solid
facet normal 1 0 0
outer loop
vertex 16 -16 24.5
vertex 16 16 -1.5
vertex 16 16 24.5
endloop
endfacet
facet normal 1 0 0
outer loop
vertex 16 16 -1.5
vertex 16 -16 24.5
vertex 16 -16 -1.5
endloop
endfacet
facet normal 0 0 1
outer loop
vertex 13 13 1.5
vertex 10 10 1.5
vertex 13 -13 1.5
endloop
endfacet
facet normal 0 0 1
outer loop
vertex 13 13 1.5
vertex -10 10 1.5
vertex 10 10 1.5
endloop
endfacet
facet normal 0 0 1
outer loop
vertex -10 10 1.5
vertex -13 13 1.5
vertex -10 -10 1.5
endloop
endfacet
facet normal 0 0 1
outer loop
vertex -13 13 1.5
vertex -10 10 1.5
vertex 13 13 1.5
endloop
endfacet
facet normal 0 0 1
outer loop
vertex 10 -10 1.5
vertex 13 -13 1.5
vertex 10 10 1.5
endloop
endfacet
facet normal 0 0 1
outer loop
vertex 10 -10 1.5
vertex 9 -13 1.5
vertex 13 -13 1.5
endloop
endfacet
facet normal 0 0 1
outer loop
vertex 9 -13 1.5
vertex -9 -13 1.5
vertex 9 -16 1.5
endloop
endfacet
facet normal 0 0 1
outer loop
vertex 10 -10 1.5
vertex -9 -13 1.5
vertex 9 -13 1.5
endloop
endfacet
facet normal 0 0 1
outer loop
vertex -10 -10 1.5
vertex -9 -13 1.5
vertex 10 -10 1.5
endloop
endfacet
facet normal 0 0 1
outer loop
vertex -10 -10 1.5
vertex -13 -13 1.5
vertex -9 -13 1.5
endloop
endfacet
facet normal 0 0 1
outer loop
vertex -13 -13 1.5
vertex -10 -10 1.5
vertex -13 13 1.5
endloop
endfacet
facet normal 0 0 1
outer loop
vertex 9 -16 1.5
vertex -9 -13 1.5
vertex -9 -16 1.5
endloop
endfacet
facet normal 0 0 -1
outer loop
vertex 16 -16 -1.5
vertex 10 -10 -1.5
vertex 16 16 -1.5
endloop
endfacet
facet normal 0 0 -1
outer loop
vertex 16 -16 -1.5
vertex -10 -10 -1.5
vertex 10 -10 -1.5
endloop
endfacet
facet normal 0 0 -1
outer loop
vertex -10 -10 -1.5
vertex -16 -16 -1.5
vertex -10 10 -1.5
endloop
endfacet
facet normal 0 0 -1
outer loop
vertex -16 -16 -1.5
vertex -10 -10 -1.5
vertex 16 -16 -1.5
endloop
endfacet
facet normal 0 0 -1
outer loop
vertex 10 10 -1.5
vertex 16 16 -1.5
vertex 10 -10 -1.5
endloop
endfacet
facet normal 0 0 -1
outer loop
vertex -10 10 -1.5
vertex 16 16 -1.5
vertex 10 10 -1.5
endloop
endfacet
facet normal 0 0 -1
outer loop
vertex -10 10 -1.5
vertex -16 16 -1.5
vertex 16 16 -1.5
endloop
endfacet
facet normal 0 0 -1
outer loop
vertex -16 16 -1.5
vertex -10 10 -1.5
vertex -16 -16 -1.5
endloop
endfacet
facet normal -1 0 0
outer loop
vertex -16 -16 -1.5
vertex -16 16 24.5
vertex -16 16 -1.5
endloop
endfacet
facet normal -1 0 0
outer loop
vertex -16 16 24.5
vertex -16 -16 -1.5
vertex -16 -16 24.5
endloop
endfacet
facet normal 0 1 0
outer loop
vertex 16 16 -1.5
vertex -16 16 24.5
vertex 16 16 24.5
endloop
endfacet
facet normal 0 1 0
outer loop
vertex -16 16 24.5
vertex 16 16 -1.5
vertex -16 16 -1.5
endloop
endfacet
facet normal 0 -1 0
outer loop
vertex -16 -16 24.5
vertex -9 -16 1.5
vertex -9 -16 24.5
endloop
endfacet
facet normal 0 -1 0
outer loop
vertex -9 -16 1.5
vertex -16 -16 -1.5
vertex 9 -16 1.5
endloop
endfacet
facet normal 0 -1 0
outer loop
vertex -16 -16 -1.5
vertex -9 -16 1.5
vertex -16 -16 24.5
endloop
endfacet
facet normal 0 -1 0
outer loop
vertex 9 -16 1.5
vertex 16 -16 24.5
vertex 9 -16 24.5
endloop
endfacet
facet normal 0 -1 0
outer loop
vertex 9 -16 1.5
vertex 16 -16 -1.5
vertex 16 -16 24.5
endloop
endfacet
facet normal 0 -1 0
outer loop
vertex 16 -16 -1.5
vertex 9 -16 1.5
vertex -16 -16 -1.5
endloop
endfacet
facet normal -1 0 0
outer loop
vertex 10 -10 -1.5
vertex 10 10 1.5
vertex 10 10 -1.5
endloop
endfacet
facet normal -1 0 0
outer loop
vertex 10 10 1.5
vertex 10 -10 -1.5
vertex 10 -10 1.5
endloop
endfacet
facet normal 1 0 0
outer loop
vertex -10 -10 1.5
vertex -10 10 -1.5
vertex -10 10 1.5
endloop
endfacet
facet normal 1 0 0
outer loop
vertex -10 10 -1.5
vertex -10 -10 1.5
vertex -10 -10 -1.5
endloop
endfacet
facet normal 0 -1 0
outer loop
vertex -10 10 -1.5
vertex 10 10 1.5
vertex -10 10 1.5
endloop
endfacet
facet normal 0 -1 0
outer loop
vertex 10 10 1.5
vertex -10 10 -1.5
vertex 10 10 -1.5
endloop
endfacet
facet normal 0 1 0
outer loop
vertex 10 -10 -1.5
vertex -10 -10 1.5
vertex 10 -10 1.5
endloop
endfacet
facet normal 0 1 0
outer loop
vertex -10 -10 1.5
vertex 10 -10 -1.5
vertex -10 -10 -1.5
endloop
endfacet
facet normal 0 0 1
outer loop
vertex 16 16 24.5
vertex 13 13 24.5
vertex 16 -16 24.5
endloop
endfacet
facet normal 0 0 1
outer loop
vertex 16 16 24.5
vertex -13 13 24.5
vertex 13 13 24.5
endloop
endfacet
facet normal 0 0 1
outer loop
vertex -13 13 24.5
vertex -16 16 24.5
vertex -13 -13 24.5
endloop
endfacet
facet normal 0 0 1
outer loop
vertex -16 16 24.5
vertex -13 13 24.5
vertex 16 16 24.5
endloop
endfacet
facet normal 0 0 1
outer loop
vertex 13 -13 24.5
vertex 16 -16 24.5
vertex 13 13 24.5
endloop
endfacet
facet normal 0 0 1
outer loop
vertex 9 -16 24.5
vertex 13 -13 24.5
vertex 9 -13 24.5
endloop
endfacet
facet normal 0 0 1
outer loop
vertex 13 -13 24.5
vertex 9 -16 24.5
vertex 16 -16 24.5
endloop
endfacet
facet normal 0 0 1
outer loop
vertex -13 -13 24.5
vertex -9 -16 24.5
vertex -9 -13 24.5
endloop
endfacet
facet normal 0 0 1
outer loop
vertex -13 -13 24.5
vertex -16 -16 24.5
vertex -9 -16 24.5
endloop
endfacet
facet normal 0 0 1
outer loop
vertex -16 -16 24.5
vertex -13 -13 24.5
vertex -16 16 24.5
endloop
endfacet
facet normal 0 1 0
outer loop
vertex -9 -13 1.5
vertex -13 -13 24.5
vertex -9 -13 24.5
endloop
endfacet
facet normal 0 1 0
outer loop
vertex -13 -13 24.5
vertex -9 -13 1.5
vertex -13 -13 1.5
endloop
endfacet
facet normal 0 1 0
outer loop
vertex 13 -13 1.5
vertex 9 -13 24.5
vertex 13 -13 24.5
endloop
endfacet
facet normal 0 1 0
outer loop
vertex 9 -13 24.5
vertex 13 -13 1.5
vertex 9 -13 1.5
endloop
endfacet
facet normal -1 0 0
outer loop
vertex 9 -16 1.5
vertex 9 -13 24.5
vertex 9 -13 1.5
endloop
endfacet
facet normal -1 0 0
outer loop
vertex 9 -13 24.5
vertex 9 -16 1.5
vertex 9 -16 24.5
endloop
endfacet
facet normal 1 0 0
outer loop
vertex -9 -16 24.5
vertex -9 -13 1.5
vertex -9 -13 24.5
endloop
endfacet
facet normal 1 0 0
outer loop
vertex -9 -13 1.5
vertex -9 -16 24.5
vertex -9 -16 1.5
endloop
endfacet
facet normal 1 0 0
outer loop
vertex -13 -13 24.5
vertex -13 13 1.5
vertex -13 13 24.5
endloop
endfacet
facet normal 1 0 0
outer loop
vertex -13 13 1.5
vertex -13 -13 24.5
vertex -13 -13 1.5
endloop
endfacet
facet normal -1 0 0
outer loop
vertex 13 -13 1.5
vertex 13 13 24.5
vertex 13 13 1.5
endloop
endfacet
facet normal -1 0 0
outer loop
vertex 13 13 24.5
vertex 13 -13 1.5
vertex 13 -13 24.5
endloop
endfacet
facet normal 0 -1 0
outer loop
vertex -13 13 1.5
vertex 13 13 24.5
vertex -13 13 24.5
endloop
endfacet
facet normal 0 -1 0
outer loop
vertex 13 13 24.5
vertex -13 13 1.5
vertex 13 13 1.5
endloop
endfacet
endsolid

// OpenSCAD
tilesize = 24;
tilethickness = 2;
tilequantity = 10;
wallthickness = 3;
openinglip = 4;
tilehalf = tilesize/2;

//base
difference() {
cube([((tilesize+2)+(wallthickness*2)),((tilesize+2)+(wallthickness*2)),wallthickness],true);
cube([tilesize-4,tilesize-4,wallthickness*2],true);
}


//left wall
translate([
((tilehalf+1+(wallthickness/2))*-1),
0,
((tilequantity*tilethickness/2)+(wallthickness*.5))])

cube([
wallthickness,
((tilesize+2)+(wallthickness*2)),
((tilequantity*tilethickness)+(wallthickness*2))],true);

//right wall
translate([
(tilehalf+1+(wallthickness/2)),
0,
((tilequantity*tilethickness/2)+(wallthickness*.5))])

cube([
wallthickness,
((tilesize+2)+(wallthickness*2)),
((tilequantity*tilethickness)+(wallthickness*2))],true);

//back wall
translate([
0,

(tilehalf+1+(wallthickness/2)),

((tilequantity*tilethickness/2)+(wallthickness*.5))])

cube([
((tilesize+2)+(wallthickness*2)),

wallthickness,

((tilequantity*tilethickness)+(wallthickness*2))],

true);

difference(){
//front wall
translate([
0,((tilehalf+1+(wallthickness/2))*-1),((tilequantity*tilethickness/2)+(wallthickness*.5))])
cube([
((tilesize+2)+(wallthickness*2)),wallthickness,((tilequantity*tilethickness)+(wallthickness*2))],true);

translate([
0,((tilehalf+1+(wallthickness/2))*-1),wallthickness*2])
cube([(tilesize+2)-(openinglip*2),wallthickness*2,(tilequantity*tilethickness*4)],true);
}
